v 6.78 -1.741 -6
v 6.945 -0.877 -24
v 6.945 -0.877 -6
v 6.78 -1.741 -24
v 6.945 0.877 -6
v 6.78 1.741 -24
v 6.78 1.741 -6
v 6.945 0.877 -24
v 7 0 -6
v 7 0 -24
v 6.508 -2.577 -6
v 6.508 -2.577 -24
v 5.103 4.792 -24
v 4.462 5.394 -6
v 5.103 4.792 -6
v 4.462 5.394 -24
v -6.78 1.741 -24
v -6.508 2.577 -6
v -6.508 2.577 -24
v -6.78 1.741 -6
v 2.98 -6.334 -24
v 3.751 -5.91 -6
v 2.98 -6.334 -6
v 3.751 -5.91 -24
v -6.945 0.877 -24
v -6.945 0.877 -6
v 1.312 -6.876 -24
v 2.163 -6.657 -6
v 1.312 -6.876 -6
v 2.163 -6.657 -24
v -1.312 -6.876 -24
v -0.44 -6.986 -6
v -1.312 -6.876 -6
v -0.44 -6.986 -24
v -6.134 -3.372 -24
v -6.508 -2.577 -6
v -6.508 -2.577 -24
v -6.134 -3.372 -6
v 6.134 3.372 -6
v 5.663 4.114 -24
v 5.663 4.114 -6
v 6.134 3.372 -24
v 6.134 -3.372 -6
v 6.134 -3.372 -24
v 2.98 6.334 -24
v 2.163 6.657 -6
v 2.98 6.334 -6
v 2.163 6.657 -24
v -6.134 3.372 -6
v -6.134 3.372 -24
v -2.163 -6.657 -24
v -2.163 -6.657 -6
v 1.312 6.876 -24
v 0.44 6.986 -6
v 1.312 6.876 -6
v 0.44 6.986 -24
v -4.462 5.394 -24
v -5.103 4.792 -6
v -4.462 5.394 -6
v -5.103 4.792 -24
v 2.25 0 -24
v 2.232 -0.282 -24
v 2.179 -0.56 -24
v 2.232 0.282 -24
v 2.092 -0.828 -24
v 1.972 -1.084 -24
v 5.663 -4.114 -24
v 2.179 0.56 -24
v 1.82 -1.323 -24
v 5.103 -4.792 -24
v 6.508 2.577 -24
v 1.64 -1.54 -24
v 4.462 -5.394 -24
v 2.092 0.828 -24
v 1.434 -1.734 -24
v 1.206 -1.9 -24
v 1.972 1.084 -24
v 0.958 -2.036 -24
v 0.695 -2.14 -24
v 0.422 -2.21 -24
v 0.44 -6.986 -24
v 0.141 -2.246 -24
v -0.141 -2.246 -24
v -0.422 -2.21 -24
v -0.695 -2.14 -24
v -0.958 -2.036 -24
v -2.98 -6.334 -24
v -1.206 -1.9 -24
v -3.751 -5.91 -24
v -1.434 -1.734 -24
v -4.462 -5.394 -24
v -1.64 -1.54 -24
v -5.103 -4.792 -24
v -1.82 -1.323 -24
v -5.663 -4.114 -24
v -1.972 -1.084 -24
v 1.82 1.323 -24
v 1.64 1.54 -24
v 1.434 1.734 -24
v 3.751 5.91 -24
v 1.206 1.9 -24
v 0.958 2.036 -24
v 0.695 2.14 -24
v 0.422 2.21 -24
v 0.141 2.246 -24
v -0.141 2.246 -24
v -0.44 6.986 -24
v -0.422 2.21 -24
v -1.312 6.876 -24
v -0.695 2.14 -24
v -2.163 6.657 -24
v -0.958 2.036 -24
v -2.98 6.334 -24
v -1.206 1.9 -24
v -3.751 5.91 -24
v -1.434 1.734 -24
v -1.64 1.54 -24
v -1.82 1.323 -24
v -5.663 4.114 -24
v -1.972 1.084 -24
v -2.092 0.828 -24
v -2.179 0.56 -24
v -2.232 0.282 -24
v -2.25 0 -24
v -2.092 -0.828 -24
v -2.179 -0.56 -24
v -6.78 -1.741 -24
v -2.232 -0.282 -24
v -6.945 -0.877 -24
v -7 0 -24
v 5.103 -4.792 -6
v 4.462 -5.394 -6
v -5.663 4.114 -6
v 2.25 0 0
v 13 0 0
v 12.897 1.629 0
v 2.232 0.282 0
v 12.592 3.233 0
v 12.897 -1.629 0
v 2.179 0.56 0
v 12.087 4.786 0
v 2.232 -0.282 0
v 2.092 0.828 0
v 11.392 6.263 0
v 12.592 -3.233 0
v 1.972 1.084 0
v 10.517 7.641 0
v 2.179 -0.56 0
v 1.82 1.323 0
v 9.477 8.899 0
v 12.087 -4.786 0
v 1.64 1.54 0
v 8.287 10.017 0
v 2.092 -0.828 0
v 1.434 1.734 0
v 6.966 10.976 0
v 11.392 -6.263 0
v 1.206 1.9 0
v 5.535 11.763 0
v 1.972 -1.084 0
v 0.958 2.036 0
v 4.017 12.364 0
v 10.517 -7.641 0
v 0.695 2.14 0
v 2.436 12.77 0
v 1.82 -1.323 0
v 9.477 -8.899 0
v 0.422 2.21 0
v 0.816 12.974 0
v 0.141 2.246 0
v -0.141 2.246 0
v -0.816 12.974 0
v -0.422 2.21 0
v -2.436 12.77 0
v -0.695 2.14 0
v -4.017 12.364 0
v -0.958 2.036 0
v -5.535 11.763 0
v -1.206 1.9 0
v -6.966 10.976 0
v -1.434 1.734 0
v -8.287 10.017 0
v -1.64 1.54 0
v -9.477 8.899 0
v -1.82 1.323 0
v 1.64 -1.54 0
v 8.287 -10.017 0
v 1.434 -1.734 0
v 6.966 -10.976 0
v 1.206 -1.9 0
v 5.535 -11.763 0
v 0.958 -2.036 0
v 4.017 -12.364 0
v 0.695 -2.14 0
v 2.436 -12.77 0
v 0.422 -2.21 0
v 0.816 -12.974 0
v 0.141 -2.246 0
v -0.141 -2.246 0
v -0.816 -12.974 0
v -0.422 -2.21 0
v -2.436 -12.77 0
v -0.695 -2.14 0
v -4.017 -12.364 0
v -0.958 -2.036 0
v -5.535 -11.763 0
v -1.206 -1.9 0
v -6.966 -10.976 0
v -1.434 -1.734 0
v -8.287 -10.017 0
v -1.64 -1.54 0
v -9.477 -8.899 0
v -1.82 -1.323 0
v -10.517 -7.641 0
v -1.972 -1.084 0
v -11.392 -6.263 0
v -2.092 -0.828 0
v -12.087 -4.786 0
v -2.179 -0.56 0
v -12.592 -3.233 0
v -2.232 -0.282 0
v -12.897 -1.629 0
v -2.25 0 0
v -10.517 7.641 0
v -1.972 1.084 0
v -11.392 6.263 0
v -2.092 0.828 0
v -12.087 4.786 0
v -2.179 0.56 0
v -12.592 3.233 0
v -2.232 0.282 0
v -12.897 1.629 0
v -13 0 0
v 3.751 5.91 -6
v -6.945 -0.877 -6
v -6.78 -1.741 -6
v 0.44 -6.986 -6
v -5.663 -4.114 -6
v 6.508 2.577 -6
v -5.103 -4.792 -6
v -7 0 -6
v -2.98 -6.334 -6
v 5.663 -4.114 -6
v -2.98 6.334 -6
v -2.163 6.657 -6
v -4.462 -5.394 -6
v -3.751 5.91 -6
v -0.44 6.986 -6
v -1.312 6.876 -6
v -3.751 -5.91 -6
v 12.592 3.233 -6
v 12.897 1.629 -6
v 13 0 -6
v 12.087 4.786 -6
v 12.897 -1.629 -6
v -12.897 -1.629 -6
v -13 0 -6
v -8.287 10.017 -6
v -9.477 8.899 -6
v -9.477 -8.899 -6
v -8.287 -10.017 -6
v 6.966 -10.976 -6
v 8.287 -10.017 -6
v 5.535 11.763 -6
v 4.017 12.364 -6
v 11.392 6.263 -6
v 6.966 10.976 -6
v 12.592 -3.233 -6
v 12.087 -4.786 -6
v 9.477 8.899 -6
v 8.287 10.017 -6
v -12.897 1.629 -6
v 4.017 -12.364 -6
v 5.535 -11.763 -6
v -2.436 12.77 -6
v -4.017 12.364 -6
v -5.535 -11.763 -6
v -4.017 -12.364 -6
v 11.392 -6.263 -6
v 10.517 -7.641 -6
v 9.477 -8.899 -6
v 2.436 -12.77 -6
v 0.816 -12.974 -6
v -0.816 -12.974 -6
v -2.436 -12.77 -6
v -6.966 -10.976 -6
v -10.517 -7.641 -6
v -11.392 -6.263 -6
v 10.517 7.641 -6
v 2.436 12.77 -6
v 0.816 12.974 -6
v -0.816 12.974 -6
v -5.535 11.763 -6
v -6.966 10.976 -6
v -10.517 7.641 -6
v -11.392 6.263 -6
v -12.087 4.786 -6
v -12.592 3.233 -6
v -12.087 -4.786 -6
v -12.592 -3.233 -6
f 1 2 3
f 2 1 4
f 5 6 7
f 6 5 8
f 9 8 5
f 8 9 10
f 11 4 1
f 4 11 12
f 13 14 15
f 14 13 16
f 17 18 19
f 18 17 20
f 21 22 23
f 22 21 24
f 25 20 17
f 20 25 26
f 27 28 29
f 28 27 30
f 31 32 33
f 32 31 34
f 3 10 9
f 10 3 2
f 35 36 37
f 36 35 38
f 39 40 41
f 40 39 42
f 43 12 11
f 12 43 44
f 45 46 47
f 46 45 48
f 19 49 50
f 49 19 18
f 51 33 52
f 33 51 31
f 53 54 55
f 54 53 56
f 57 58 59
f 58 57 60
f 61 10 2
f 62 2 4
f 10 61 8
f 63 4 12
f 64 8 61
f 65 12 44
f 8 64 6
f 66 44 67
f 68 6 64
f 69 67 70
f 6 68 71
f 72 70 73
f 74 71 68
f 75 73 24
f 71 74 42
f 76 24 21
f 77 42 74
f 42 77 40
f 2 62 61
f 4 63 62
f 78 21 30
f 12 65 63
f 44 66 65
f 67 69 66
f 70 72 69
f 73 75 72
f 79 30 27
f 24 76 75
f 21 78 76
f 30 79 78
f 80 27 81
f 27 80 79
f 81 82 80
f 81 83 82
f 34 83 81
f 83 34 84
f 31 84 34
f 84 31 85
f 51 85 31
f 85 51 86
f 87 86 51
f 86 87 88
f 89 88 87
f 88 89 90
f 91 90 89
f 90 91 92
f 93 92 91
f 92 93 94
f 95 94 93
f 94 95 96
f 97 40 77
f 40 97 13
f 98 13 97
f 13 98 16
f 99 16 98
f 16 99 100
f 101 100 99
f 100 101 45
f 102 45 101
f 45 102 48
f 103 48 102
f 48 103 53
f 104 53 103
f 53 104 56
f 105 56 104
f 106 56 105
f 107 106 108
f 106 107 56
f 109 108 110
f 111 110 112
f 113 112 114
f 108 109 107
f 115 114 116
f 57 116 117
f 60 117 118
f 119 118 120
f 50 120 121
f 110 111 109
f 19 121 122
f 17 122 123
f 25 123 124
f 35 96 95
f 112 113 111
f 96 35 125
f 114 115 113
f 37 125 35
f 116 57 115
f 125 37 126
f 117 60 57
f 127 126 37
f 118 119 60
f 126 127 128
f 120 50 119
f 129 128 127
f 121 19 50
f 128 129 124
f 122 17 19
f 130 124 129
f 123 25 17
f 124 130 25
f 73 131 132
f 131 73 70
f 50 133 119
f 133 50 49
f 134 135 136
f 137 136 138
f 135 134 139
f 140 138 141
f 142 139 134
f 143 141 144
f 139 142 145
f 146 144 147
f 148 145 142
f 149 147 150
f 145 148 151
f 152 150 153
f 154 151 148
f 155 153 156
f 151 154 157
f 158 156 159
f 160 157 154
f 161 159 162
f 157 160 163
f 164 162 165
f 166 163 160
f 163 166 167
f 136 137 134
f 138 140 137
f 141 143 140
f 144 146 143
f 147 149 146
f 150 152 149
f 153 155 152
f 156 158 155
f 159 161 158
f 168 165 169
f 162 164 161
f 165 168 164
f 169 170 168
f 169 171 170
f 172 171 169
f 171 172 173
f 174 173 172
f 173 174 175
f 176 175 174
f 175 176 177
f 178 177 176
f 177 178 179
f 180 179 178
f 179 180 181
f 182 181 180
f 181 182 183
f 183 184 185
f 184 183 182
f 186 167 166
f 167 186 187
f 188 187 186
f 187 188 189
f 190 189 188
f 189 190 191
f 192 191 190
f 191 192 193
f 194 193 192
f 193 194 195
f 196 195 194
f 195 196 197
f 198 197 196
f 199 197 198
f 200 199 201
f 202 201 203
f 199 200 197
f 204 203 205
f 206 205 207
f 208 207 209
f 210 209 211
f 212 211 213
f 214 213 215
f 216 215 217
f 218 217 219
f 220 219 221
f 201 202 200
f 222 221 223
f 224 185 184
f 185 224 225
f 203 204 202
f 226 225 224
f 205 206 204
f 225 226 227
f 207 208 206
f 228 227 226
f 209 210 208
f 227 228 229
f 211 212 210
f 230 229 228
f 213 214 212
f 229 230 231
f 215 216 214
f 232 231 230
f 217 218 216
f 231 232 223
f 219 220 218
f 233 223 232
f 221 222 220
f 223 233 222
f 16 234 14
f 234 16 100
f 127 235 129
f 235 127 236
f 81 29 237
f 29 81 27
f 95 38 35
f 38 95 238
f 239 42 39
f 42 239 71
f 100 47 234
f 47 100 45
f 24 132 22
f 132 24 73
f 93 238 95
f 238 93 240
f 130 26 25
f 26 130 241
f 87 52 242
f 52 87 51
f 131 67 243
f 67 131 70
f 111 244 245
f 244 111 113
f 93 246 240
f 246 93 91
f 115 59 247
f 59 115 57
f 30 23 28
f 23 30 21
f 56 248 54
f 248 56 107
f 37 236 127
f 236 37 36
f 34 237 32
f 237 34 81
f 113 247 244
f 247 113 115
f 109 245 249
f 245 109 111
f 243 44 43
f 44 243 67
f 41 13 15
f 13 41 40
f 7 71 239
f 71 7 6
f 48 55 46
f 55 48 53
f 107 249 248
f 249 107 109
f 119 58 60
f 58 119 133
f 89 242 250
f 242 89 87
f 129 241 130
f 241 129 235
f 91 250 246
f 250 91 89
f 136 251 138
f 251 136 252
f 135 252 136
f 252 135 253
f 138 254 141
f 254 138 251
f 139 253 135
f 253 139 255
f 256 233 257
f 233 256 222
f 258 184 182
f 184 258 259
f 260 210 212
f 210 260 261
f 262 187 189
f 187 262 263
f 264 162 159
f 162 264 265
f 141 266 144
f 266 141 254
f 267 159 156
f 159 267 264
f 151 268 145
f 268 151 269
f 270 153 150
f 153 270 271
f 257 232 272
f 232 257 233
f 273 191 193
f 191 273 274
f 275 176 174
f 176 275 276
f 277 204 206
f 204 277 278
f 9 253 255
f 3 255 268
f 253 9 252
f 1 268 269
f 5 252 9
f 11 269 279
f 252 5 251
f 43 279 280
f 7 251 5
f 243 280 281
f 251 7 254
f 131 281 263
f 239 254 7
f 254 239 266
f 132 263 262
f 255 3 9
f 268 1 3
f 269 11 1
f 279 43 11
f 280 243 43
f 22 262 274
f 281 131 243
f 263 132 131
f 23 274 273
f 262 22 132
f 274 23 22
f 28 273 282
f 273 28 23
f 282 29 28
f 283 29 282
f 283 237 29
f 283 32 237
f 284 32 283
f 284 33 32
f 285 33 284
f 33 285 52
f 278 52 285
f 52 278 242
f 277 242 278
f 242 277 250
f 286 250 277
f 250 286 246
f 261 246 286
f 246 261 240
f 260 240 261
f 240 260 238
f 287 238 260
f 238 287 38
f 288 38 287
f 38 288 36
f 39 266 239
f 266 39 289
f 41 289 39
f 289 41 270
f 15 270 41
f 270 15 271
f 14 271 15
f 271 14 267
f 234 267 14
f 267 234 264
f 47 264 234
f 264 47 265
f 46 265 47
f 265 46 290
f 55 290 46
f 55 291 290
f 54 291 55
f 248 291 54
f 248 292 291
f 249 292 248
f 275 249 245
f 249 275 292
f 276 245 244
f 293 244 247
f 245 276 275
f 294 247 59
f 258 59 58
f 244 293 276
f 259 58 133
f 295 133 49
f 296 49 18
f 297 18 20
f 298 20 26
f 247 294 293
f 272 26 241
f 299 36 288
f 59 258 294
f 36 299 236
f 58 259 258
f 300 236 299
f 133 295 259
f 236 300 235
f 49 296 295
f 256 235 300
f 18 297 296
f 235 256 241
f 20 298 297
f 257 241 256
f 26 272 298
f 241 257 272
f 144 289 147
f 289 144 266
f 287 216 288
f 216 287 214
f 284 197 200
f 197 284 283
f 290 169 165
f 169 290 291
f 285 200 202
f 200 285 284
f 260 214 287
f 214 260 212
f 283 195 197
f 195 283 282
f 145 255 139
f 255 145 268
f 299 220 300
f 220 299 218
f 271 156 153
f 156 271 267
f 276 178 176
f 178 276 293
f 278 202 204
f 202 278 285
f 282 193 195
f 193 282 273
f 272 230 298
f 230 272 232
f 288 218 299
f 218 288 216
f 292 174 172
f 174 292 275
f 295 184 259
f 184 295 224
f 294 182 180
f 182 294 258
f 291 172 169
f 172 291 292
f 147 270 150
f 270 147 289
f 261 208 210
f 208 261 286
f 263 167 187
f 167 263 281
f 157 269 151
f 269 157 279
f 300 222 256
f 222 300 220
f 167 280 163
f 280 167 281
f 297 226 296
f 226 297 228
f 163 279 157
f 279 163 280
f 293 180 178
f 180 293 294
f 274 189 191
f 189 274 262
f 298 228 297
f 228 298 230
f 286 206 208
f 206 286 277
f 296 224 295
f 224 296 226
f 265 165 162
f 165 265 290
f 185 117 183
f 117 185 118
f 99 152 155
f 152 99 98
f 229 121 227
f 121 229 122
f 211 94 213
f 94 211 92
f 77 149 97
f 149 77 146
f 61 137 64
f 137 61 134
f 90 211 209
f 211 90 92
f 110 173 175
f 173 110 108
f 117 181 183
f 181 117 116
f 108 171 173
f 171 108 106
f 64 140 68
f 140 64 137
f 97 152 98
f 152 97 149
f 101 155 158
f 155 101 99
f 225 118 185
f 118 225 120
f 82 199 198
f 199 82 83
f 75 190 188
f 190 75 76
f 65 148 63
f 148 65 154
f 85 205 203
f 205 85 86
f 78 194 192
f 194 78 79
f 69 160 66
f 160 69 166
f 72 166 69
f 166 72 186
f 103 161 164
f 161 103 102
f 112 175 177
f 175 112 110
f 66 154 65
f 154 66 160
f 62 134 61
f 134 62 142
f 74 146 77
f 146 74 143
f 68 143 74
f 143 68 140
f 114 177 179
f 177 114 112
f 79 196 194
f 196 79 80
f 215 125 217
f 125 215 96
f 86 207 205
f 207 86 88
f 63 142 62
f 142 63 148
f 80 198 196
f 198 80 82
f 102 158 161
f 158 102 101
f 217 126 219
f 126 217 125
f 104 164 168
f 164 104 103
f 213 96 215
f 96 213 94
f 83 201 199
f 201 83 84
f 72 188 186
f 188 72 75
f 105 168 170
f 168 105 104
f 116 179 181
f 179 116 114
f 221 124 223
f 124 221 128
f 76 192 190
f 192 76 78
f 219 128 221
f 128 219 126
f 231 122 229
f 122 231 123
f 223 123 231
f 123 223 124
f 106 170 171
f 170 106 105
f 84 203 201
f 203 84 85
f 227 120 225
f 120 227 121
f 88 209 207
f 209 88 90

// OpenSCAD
$fn = 50;


difference() {
	union() {
		translate(v = [0, 0, -24.0000000000]) {
			cylinder(h = 24, r = 7.0000000000);
		}
		translate(v = [0, 0, -6.0000000000]) {
			cylinder(h = 6, r = 13.0000000000);
		}
	}
	union() {
		#translate(v = [0, 0, -24]) {
			cylinder(h = 24, r = 2.2500000000);
		}
	}
}
